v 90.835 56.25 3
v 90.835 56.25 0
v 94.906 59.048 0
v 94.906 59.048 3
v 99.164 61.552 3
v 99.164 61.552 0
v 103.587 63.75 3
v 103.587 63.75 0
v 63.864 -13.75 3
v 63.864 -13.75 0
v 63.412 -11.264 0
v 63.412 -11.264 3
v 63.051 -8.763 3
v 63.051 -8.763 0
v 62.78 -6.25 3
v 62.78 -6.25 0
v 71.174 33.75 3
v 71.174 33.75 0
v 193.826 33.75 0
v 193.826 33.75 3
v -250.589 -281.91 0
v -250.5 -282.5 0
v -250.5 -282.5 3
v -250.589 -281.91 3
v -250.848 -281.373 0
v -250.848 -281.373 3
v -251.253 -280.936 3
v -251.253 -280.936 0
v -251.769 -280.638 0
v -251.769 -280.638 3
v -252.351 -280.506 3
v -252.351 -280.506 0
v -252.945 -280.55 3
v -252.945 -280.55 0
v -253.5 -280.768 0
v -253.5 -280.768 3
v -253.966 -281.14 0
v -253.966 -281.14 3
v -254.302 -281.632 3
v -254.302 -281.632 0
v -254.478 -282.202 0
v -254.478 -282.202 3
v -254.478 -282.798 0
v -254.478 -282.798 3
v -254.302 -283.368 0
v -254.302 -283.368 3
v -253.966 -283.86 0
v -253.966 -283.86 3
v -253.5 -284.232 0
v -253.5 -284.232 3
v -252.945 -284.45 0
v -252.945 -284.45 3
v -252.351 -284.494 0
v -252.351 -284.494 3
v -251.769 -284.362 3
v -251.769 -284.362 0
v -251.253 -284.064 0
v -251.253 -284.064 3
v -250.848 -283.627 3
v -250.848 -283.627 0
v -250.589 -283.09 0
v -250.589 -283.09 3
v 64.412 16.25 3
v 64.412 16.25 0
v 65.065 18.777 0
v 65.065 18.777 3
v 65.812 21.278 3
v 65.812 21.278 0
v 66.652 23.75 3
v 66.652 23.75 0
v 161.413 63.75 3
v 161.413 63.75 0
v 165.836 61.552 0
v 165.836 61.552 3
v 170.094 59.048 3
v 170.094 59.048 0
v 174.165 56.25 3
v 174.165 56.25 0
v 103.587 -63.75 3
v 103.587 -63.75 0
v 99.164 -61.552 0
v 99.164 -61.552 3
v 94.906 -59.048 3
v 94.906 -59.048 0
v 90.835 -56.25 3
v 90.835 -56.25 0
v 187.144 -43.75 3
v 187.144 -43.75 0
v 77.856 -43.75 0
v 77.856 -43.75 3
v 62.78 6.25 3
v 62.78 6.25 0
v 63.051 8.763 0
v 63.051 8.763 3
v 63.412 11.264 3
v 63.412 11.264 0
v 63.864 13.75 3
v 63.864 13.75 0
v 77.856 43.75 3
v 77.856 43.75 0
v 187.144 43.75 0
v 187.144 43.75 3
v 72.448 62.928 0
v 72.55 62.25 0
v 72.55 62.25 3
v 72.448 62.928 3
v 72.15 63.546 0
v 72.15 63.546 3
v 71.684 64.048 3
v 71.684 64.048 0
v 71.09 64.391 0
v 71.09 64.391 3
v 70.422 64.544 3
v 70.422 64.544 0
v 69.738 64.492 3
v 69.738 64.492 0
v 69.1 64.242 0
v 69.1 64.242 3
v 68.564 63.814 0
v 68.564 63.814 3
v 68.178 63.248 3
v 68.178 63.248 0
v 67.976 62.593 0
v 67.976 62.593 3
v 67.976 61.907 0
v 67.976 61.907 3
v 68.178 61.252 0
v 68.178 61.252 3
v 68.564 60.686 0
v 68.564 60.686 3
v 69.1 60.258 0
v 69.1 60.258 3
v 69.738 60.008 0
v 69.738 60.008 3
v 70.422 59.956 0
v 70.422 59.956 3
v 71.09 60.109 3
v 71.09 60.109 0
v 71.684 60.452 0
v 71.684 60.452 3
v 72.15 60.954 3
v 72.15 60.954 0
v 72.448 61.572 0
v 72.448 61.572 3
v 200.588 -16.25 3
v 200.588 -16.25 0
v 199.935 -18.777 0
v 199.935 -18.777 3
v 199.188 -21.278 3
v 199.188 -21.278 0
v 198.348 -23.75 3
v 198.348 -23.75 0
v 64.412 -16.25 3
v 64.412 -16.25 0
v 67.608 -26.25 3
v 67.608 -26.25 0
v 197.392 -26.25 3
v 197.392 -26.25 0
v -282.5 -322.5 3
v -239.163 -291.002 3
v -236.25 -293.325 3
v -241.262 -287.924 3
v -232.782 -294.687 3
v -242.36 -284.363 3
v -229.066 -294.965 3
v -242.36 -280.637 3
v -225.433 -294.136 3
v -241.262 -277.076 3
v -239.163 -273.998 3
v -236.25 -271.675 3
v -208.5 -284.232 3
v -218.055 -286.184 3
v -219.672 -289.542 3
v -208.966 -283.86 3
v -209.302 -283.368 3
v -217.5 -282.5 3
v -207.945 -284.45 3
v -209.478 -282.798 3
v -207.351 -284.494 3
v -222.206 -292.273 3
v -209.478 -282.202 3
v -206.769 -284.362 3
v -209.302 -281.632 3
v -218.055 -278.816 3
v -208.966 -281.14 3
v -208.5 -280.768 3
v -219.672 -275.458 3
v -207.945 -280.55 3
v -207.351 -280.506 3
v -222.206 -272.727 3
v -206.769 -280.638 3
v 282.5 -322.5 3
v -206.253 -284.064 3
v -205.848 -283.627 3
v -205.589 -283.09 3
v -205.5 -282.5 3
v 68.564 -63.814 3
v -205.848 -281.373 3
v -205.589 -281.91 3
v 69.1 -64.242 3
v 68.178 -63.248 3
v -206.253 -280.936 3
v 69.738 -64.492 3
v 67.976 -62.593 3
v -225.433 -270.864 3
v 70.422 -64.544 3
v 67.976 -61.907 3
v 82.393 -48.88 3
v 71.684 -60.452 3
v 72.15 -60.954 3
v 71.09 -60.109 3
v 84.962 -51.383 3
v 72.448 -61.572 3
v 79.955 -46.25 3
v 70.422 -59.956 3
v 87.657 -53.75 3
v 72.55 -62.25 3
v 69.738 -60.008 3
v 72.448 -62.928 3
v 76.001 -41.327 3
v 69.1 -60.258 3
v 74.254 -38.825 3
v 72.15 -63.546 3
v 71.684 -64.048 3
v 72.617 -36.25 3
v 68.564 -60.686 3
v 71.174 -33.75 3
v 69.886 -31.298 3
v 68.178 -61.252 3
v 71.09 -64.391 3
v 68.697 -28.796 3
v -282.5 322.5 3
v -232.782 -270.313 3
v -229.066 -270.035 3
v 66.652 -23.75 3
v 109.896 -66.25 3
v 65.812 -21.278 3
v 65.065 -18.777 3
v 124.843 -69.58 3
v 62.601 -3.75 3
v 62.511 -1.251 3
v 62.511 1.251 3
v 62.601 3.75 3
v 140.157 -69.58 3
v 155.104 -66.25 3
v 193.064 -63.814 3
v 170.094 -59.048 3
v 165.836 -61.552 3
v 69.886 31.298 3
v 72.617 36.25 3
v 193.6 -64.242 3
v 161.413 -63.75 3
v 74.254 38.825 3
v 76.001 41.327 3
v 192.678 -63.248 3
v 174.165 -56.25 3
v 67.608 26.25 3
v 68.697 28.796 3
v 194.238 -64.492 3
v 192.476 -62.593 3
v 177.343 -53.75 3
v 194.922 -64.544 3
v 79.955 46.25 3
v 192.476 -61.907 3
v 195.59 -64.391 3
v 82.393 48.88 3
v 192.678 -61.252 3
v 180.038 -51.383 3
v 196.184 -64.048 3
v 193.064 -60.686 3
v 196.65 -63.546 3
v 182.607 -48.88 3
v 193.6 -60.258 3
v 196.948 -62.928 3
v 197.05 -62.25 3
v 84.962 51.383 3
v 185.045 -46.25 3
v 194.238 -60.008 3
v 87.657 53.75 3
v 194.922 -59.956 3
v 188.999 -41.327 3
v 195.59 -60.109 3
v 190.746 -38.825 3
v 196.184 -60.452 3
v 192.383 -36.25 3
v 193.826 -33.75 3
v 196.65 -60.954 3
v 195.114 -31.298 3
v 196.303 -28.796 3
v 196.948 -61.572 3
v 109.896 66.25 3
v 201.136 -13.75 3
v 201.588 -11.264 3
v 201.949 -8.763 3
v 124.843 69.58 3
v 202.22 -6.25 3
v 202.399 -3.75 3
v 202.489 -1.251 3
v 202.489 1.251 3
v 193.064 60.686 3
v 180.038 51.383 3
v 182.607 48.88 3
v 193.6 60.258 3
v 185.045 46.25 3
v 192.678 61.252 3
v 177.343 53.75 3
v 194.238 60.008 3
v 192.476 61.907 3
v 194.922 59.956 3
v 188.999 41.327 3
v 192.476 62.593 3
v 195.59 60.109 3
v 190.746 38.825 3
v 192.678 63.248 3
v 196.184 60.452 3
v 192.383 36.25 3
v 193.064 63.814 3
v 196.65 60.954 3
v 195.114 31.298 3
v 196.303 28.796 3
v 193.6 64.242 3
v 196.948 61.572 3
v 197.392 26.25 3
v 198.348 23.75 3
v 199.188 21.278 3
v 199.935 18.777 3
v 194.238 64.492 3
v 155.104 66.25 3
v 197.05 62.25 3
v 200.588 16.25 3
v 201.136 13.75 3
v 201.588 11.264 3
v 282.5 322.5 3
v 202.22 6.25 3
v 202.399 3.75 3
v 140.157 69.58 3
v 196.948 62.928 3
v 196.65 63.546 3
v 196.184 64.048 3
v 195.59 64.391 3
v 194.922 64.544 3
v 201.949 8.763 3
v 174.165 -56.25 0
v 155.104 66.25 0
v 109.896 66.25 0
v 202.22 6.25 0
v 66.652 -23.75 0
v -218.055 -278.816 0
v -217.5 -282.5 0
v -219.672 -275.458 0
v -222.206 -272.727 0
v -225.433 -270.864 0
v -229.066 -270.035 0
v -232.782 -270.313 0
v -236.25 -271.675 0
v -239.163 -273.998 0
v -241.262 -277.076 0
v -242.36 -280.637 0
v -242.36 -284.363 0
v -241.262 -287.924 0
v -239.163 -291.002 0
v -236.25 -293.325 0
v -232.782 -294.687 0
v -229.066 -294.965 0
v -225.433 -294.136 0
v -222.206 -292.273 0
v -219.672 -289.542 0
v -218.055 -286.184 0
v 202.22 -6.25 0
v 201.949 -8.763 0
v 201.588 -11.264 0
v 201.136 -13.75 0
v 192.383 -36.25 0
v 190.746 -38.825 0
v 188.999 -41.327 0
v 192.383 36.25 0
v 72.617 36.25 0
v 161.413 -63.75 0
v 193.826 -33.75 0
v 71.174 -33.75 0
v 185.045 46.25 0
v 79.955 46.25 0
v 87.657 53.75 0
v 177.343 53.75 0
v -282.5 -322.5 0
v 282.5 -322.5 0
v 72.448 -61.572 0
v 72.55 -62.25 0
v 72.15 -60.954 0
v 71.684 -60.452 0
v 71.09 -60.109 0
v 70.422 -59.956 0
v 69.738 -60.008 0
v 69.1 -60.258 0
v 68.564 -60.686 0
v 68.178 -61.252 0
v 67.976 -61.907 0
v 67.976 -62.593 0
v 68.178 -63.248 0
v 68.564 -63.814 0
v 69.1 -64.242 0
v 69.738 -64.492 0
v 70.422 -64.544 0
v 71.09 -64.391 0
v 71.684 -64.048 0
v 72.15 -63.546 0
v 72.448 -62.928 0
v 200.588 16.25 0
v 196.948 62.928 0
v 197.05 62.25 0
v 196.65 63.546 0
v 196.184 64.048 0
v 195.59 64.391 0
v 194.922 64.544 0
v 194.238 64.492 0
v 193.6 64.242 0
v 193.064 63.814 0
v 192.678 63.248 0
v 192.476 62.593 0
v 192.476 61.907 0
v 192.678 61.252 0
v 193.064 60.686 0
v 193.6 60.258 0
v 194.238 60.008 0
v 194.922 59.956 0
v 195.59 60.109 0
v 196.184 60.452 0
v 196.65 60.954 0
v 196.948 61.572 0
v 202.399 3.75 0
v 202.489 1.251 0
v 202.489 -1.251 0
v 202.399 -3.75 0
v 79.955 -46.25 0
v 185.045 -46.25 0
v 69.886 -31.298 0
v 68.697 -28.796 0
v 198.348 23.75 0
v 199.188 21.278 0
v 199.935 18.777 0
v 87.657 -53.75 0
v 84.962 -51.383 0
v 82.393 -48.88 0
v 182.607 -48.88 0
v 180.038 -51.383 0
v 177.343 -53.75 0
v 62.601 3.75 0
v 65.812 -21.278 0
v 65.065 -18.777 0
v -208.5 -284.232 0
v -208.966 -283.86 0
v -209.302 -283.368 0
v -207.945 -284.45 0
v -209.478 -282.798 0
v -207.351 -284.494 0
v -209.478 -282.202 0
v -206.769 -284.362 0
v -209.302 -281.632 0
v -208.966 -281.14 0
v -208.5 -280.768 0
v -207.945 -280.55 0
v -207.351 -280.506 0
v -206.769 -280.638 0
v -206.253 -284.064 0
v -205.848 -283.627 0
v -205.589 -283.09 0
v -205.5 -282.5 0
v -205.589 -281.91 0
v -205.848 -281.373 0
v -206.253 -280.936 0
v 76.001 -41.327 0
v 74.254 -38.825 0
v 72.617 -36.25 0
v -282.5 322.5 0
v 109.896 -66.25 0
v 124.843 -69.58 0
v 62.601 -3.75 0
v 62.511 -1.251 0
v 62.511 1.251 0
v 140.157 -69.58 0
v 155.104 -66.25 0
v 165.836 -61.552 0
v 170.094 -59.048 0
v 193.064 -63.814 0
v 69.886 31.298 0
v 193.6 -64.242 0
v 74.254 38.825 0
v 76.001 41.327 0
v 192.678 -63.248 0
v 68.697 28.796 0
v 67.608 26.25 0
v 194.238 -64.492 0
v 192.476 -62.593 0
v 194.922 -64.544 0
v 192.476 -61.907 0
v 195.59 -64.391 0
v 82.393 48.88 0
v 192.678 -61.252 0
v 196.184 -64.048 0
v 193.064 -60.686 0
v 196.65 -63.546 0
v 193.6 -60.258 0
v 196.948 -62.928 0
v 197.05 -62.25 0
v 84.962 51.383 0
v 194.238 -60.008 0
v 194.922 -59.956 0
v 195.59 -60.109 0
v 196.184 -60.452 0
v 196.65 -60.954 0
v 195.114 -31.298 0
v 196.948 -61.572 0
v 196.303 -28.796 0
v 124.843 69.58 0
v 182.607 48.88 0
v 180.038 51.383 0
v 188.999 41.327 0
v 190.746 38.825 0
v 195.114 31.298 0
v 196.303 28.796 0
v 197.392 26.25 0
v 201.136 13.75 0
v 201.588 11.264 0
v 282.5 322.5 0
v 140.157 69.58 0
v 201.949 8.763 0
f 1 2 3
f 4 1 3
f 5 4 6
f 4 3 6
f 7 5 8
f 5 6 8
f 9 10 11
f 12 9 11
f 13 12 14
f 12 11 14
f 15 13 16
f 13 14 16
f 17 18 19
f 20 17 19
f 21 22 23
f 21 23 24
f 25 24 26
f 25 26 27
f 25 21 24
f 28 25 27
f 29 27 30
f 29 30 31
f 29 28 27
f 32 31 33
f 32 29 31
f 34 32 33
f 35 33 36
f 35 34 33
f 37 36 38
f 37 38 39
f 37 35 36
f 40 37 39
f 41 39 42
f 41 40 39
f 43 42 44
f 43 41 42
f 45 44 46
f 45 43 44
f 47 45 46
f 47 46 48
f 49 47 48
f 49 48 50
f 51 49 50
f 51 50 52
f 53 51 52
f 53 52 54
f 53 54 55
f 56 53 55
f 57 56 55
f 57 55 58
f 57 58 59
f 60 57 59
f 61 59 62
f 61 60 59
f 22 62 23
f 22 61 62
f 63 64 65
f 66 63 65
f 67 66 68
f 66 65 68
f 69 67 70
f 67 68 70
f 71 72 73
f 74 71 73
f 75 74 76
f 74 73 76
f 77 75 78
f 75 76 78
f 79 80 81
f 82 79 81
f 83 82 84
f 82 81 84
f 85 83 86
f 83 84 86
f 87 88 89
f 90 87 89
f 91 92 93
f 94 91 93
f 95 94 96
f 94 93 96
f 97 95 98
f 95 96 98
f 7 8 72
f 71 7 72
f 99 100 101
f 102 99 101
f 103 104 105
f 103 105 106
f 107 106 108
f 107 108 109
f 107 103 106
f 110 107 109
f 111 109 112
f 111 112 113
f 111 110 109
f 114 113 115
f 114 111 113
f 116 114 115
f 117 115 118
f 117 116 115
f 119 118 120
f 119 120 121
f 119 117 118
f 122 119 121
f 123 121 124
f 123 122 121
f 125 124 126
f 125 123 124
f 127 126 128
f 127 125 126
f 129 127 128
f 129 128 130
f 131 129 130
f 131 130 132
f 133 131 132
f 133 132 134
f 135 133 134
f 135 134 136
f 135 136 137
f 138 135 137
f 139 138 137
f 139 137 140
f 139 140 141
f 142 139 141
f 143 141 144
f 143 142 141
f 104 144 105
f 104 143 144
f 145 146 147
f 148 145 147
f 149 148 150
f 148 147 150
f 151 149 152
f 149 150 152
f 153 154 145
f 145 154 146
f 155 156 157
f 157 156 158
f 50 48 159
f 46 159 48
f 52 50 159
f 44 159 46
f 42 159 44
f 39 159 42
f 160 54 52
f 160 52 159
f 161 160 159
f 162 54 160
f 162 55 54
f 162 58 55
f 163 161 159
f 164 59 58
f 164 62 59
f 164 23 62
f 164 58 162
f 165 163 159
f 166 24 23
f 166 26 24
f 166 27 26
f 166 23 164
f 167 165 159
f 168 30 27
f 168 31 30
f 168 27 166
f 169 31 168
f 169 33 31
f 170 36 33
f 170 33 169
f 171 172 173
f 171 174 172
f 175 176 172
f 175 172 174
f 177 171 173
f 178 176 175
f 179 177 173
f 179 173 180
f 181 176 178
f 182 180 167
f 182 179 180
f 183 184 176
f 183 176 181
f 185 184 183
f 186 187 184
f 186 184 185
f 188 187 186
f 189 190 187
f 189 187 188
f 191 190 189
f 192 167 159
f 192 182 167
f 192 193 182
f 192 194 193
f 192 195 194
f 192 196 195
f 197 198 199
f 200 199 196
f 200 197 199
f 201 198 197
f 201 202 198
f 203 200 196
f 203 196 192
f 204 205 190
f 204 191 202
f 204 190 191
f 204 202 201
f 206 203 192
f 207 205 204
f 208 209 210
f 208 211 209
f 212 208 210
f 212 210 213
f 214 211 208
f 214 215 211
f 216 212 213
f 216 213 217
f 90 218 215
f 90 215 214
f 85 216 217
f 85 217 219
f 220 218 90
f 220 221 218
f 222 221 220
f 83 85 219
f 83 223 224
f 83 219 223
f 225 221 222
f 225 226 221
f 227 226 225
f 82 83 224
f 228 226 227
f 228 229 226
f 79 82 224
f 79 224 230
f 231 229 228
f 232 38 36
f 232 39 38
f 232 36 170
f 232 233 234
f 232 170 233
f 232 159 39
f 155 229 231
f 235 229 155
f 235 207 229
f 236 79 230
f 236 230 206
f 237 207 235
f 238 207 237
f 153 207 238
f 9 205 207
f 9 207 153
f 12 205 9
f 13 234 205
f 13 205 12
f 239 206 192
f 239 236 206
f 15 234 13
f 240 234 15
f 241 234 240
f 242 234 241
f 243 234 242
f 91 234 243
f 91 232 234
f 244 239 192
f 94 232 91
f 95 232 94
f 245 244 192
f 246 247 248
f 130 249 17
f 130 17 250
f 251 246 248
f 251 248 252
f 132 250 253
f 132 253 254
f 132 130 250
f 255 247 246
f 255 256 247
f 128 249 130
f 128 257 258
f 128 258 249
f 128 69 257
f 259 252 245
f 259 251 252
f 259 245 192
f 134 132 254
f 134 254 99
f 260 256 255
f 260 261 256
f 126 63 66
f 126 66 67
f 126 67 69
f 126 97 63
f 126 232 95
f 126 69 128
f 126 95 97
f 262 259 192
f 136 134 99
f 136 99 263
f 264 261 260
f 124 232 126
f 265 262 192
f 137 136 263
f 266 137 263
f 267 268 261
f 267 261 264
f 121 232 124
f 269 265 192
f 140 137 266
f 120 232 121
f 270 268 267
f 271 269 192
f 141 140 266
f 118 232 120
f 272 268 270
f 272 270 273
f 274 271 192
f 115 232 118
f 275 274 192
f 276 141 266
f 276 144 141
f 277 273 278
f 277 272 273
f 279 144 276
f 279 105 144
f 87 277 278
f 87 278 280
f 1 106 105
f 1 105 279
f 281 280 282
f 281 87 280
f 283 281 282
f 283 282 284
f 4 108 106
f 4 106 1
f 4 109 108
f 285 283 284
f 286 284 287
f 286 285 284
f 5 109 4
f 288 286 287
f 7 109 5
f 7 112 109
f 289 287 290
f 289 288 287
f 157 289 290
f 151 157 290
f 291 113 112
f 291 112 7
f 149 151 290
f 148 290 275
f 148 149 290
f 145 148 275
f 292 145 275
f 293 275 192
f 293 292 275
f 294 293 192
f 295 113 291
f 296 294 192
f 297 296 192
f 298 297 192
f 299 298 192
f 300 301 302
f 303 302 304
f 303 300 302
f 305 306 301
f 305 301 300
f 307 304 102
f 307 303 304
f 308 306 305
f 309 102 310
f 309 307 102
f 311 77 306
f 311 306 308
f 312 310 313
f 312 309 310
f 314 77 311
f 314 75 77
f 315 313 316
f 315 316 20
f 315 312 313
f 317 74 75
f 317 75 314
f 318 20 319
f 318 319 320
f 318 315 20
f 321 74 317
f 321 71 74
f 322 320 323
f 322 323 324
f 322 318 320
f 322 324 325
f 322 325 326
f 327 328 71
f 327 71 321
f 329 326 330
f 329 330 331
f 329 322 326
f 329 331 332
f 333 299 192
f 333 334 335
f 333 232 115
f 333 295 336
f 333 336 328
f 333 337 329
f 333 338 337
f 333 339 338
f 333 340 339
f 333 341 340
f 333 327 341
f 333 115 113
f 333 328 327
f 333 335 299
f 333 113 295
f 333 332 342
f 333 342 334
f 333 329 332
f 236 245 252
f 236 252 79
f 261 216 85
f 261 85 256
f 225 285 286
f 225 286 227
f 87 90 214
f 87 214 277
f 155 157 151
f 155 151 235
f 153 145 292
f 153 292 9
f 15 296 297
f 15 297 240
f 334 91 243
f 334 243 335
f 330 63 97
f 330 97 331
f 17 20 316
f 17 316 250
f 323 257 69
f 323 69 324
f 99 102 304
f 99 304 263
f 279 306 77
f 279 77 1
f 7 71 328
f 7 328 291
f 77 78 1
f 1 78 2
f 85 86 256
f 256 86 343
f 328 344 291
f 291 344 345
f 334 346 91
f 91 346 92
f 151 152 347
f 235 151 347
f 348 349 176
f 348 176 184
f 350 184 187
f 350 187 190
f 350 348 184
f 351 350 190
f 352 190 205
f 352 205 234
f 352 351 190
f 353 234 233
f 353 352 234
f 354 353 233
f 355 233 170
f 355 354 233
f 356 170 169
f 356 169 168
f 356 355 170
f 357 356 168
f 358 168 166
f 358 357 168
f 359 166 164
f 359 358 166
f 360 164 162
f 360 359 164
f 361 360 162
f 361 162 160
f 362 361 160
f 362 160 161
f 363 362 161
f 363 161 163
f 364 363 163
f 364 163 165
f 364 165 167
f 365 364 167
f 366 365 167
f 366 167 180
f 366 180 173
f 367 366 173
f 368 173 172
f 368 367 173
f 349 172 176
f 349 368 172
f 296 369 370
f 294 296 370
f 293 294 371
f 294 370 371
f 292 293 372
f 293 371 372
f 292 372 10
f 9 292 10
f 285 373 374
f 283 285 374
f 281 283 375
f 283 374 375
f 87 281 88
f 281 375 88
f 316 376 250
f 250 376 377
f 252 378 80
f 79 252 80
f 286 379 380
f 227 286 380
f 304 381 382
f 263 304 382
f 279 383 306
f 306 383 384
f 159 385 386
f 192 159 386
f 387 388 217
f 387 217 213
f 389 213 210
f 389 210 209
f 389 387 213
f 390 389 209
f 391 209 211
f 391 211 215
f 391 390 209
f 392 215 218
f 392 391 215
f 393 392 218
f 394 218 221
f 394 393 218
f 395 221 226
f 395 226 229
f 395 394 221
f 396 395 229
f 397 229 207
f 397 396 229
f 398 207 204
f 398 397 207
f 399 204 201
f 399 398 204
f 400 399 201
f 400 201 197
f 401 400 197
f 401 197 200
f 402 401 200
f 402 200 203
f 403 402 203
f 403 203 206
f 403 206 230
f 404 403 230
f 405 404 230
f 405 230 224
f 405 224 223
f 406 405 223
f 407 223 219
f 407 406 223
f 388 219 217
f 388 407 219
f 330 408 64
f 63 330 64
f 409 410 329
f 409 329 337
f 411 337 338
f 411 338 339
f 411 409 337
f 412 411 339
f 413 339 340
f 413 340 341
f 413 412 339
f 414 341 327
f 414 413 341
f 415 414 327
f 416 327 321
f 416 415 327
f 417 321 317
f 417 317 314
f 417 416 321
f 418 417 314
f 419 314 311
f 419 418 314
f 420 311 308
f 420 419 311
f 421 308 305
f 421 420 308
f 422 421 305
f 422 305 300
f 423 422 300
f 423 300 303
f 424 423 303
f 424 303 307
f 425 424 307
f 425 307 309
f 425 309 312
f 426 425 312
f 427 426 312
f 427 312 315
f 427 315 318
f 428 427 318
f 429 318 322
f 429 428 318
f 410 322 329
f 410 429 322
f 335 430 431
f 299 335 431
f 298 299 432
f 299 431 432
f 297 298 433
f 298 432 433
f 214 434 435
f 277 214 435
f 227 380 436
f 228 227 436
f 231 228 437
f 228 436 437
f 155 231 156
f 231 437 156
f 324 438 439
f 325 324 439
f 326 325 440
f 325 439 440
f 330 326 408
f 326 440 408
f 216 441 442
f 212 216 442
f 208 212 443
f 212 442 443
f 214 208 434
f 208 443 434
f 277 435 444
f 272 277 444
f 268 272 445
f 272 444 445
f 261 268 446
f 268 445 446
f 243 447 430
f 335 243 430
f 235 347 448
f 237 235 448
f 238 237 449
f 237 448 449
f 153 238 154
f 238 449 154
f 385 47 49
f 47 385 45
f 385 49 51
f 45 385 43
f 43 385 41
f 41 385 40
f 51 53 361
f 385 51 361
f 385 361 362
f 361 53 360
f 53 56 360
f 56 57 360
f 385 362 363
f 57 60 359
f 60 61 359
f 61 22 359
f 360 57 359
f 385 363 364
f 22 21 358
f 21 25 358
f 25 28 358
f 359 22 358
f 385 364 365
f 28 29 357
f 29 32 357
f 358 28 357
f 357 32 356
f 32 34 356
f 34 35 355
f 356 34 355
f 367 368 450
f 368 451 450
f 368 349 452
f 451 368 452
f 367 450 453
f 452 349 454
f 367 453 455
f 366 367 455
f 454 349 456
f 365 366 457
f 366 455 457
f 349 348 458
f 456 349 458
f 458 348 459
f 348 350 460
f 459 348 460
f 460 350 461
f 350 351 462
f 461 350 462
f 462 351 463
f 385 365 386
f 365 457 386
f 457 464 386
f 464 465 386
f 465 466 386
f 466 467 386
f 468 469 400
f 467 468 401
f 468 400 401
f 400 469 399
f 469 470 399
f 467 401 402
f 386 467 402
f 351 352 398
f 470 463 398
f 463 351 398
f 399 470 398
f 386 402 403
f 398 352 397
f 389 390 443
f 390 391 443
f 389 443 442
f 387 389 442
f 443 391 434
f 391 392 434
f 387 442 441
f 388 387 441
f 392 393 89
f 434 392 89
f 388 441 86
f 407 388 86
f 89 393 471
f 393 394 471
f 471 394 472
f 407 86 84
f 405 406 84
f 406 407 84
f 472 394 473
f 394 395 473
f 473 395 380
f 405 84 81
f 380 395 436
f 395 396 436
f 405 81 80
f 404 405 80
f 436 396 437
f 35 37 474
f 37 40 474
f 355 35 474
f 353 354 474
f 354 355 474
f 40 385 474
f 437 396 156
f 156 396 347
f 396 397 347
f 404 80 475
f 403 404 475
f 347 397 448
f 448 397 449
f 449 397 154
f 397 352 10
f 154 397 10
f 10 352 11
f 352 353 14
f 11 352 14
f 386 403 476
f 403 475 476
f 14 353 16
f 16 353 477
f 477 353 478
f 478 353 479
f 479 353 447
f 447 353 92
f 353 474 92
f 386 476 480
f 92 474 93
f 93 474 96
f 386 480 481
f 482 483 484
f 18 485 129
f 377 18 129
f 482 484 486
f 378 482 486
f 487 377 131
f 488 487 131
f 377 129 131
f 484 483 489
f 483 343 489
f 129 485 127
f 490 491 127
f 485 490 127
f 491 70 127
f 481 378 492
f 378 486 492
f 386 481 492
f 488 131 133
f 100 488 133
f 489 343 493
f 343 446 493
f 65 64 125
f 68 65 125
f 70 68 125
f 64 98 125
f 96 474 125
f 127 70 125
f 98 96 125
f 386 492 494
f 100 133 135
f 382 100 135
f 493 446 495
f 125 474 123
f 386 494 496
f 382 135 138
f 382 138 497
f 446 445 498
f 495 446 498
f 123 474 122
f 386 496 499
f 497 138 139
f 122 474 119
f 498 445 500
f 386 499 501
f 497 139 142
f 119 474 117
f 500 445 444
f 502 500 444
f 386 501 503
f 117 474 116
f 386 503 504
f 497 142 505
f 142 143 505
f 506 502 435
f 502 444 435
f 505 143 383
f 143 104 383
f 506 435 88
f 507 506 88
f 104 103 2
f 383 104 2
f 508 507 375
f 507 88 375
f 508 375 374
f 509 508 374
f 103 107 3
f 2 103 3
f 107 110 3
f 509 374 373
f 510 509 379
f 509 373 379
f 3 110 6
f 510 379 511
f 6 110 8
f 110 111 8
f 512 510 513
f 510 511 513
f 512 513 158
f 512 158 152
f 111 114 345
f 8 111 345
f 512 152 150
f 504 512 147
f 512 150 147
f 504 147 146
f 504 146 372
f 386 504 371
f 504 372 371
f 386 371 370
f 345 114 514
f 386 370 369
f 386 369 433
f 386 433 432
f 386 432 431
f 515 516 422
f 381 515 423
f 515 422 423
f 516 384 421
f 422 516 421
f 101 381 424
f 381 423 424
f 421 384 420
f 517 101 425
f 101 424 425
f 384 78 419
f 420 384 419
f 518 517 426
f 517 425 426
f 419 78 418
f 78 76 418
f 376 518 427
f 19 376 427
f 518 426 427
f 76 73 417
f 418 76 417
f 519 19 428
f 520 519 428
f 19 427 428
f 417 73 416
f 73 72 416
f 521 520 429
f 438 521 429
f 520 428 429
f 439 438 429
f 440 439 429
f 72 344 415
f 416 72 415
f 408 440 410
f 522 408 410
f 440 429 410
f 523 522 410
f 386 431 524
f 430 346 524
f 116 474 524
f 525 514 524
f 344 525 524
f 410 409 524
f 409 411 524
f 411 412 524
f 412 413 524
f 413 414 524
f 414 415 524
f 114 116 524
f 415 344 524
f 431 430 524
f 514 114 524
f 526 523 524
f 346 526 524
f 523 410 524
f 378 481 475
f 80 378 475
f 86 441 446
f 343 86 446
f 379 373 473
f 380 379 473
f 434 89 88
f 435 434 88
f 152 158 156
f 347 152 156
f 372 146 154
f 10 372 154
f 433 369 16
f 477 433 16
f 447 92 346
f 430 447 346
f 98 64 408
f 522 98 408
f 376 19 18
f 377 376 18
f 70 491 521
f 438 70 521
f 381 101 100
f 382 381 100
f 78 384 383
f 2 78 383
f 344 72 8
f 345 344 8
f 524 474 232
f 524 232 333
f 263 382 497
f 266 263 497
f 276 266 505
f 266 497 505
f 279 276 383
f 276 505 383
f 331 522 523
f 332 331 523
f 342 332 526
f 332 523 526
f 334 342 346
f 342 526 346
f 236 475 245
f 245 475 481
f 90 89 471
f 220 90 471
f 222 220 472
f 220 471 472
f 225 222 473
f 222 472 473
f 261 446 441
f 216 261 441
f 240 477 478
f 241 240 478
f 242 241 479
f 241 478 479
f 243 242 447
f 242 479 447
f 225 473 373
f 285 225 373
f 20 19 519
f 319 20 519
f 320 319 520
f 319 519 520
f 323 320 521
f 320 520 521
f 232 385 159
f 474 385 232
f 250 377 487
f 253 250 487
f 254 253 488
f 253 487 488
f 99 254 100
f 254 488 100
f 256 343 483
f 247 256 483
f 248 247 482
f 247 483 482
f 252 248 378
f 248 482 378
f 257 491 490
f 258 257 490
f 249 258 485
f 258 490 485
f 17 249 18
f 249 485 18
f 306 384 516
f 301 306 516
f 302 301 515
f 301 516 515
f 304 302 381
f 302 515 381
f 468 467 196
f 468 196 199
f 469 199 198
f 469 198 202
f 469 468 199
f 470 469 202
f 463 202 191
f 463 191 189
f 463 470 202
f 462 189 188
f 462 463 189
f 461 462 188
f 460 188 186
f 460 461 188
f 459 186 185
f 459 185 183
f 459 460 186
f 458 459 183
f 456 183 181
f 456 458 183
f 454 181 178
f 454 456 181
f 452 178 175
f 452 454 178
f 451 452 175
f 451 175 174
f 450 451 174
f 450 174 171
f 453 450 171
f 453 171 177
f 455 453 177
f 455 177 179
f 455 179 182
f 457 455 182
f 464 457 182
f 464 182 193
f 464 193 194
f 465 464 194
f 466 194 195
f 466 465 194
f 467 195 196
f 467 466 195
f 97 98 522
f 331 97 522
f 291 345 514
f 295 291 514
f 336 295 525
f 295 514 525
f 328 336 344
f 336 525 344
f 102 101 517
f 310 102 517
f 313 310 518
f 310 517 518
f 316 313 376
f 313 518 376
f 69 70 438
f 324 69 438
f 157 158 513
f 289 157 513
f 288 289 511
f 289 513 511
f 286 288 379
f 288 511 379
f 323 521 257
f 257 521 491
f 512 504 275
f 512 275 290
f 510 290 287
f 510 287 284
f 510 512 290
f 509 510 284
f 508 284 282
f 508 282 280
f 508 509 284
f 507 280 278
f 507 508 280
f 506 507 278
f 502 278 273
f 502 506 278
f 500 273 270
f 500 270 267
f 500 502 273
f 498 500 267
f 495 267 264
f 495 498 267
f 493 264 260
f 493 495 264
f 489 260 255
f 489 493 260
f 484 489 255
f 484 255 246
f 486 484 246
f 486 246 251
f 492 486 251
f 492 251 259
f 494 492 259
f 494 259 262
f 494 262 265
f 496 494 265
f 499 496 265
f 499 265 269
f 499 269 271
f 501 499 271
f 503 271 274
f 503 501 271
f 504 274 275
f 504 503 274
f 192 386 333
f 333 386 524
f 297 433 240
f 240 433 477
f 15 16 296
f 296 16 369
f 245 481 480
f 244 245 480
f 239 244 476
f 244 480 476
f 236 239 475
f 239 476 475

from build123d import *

# Parameters (mm, degrees)
SKICA1_W                = 565
SKICA1_H                = 645
SKICA1_R                = 2
SKICA1_R_2              = 12.5
SKICA1_R_3              = 2.3
P_IDAT_VYSUNUT_M1_DEPTH = 3


with BuildPart() as part:
    # Skica1 → Přidat vysunutím1 (new body)
    with BuildSketch(Plane.XY):
        Rectangle(SKICA1_W, SKICA1_H)
        with BuildLine():
            Line((177.343477787, -53.75), (87.656522213, -53.75))
            ThreePointArc((87.656522213, -53.75), (83.661766134, -50.148049941), (79.955376108, -46.25))
            Line((79.955376108, -46.25), (185.044623892, -46.25))
            ThreePointArc((185.044623892, -46.25), (181.338233866, -50.148049941), (177.343477787, -53.75))
        make_face(mode=Mode.SUBTRACT)
        with BuildLine():
            Line((90.835416719, -56.25), (174.164583281, -56.25))
            ThreePointArc((174.164583281, -56.25), (167.987274157, -60.337827048), (161.412583766, -63.75))
            Line((161.412583766, -63.75), (103.587416234, -63.75))
            ThreePointArc((103.587416234, -63.75), (97.012725843, -60.337827048), (90.835416719, -56.25))
        make_face(mode=Mode.SUBTRACT)
        with Locations((-252.5, -282.5)):
            Circle(SKICA1_R, mode=Mode.SUBTRACT)
        with Locations((-230, -282.5)):
            Circle(SKICA1_R_2, mode=Mode.SUBTRACT)
        with Locations((-207.5, -282.5)):
            Circle(SKICA1_R, mode=Mode.SUBTRACT)
        with BuildLine():
            ThreePointArc((192.382697835, -36.25), (189.885872046, -40.085679357), (187.143732486, -43.75))
            Line((187.143732486, -43.75), (77.856267514, -43.75))
            ThreePointArc((77.856267514, -43.75), (75.114127954, -40.085679357), (72.617302165, -36.25))
            Line((72.617302165, -36.25), (192.382697835, -36.25))
        make_face(mode=Mode.SUBTRACT)
        with BuildLine():
            ThreePointArc((197.391736762, -26.25), (195.720425822, -30.052915979), (193.82648286, -33.75))
            Line((193.82648286, -33.75), (71.17351714, -33.75))
            ThreePointArc((71.17351714, -33.75), (69.279574178, -30.052915979), (67.608263238, -26.25))
            Line((67.608263238, -26.25), (197.391736762, -26.25))
        make_face(mode=Mode.SUBTRACT)
        with BuildLine():
            ThreePointArc((200.587719157, -16.25), (199.572689903, -20.031332187), (198.347835955, -23.75))
            Line((198.347835955, -23.75), (66.652164045, -23.75))
            ThreePointArc((66.652164045, -23.75), (65.427310097, -20.031332187), (64.412280843, -16.25))
            Line((64.412280843, -16.25), (200.587719157, -16.25))
        make_face(mode=Mode.SUBTRACT)
        with BuildLine():
            ThreePointArc((202.220423837, -6.25), (201.779911608, -10.014681604), (201.136269566, -13.75))
            Line((201.136269566, -13.75), (63.863730434, -13.75))
            ThreePointArc((63.863730434, -13.75), (63.220088392, -10.014681604), (62.779576163, -6.25))
            Line((62.779576163, -6.25), (202.220423837, -6.25))
        make_face(mode=Mode.SUBTRACT)
        with BuildLine():
            Line((202.3994814, -3.75), (62.6005186, -3.75))
            ThreePointArc((62.6005186, -3.75), (62.5, 0), (62.6005186, 3.75))
            Line((62.6005186, 3.75), (202.3994814, 3.75))
            ThreePointArc((202.3994814, 3.75), (202.5, 0), (202.3994814, -3.75))
        make_face(mode=Mode.SUBTRACT)
        with BuildLine():
            ThreePointArc((201.136269566, 13.75), (201.779911608, 10.014681604), (202.220423837, 6.25))
            Line((202.220423837, 6.25), (62.779576163, 6.25))
            ThreePointArc((62.779576163, 6.25), (63.220088392, 10.014681604), (63.863730434, 13.75))
            Line((63.863730434, 13.75), (201.136269566, 13.75))
        make_face(mode=Mode.SUBTRACT)
        with BuildLine():
            ThreePointArc((198.347835955, 23.75), (199.572689903, 20.031332187), (200.587719157, 16.25))
            Line((200.587719157, 16.25), (64.412280843, 16.25))
            ThreePointArc((64.412280843, 16.25), (65.427310097, 20.031332187), (66.652164045, 23.75))
            Line((66.652164045, 23.75), (198.347835955, 23.75))
        make_face(mode=Mode.SUBTRACT)
        with BuildLine():
            ThreePointArc((193.82648286, 33.75), (195.720425822, 30.052915979), (197.391736762, 26.25))
            Line((197.391736762, 26.25), (67.608263238, 26.25))
            ThreePointArc((67.608263238, 26.25), (69.279574178, 30.052915979), (71.17351714, 33.75))
            Line((71.17351714, 33.75), (193.82648286, 33.75))
        make_face(mode=Mode.SUBTRACT)
        with BuildLine():
            ThreePointArc((187.143732486, 43.75), (189.885872046, 40.085679357), (192.382697835, 36.25))
            Line((192.382697835, 36.25), (72.617302165, 36.25))
            ThreePointArc((72.617302165, 36.25), (75.114127954, 40.085679357), (77.856267514, 43.75))
            Line((77.856267514, 43.75), (187.143732486, 43.75))
        make_face(mode=Mode.SUBTRACT)
        with BuildLine():
            ThreePointArc((177.343477787, 53.75), (181.338233866, 50.148049941), (185.044623892, 46.25))
            Line((185.044623892, 46.25), (79.955376108, 46.25))
            ThreePointArc((79.955376108, 46.25), (83.661766134, 50.148049941), (87.656522213, 53.75))
            Line((87.656522213, 53.75), (177.343477787, 53.75))
        make_face(mode=Mode.SUBTRACT)
        with BuildLine():
            ThreePointArc((161.412583766, 63.75), (167.987274157, 60.337827048), (174.164583281, 56.25))
            Line((174.164583281, 56.25), (90.835416719, 56.25))
            ThreePointArc((90.835416719, 56.25), (97.012725843, 60.337827048), (103.587416234, 63.75))
            Line((103.587416234, 63.75), (161.412583766, 63.75))
        make_face(mode=Mode.SUBTRACT)
        with Locations((194.75, 62.25)):
            Circle(SKICA1_R_3, mode=Mode.SUBTRACT)
        with BuildLine():
            ThreePointArc((109.89607335, 66.25), (132.5, 70), (155.10392665, 66.25))
            Line((155.10392665, 66.25), (109.89607335, 66.25))
        make_face(mode=Mode.SUBTRACT)
        with Locations((70.25, 62.25)):
            Circle(SKICA1_R_3, mode=Mode.SUBTRACT)
        with Locations((194.75, -62.25)):
            Circle(SKICA1_R_3, mode=Mode.SUBTRACT)
        with Locations((70.25, -62.25)):
            Circle(SKICA1_R_3, mode=Mode.SUBTRACT)
        with BuildLine():
            ThreePointArc((155.10392665, -66.25), (132.5, -70), (109.89607335, -66.25))
            Line((109.89607335, -66.25), (155.10392665, -66.25))
        make_face(mode=Mode.SUBTRACT)
    extrude(amount=P_IDAT_VYSUNUT_M1_DEPTH)


solid = part.part
